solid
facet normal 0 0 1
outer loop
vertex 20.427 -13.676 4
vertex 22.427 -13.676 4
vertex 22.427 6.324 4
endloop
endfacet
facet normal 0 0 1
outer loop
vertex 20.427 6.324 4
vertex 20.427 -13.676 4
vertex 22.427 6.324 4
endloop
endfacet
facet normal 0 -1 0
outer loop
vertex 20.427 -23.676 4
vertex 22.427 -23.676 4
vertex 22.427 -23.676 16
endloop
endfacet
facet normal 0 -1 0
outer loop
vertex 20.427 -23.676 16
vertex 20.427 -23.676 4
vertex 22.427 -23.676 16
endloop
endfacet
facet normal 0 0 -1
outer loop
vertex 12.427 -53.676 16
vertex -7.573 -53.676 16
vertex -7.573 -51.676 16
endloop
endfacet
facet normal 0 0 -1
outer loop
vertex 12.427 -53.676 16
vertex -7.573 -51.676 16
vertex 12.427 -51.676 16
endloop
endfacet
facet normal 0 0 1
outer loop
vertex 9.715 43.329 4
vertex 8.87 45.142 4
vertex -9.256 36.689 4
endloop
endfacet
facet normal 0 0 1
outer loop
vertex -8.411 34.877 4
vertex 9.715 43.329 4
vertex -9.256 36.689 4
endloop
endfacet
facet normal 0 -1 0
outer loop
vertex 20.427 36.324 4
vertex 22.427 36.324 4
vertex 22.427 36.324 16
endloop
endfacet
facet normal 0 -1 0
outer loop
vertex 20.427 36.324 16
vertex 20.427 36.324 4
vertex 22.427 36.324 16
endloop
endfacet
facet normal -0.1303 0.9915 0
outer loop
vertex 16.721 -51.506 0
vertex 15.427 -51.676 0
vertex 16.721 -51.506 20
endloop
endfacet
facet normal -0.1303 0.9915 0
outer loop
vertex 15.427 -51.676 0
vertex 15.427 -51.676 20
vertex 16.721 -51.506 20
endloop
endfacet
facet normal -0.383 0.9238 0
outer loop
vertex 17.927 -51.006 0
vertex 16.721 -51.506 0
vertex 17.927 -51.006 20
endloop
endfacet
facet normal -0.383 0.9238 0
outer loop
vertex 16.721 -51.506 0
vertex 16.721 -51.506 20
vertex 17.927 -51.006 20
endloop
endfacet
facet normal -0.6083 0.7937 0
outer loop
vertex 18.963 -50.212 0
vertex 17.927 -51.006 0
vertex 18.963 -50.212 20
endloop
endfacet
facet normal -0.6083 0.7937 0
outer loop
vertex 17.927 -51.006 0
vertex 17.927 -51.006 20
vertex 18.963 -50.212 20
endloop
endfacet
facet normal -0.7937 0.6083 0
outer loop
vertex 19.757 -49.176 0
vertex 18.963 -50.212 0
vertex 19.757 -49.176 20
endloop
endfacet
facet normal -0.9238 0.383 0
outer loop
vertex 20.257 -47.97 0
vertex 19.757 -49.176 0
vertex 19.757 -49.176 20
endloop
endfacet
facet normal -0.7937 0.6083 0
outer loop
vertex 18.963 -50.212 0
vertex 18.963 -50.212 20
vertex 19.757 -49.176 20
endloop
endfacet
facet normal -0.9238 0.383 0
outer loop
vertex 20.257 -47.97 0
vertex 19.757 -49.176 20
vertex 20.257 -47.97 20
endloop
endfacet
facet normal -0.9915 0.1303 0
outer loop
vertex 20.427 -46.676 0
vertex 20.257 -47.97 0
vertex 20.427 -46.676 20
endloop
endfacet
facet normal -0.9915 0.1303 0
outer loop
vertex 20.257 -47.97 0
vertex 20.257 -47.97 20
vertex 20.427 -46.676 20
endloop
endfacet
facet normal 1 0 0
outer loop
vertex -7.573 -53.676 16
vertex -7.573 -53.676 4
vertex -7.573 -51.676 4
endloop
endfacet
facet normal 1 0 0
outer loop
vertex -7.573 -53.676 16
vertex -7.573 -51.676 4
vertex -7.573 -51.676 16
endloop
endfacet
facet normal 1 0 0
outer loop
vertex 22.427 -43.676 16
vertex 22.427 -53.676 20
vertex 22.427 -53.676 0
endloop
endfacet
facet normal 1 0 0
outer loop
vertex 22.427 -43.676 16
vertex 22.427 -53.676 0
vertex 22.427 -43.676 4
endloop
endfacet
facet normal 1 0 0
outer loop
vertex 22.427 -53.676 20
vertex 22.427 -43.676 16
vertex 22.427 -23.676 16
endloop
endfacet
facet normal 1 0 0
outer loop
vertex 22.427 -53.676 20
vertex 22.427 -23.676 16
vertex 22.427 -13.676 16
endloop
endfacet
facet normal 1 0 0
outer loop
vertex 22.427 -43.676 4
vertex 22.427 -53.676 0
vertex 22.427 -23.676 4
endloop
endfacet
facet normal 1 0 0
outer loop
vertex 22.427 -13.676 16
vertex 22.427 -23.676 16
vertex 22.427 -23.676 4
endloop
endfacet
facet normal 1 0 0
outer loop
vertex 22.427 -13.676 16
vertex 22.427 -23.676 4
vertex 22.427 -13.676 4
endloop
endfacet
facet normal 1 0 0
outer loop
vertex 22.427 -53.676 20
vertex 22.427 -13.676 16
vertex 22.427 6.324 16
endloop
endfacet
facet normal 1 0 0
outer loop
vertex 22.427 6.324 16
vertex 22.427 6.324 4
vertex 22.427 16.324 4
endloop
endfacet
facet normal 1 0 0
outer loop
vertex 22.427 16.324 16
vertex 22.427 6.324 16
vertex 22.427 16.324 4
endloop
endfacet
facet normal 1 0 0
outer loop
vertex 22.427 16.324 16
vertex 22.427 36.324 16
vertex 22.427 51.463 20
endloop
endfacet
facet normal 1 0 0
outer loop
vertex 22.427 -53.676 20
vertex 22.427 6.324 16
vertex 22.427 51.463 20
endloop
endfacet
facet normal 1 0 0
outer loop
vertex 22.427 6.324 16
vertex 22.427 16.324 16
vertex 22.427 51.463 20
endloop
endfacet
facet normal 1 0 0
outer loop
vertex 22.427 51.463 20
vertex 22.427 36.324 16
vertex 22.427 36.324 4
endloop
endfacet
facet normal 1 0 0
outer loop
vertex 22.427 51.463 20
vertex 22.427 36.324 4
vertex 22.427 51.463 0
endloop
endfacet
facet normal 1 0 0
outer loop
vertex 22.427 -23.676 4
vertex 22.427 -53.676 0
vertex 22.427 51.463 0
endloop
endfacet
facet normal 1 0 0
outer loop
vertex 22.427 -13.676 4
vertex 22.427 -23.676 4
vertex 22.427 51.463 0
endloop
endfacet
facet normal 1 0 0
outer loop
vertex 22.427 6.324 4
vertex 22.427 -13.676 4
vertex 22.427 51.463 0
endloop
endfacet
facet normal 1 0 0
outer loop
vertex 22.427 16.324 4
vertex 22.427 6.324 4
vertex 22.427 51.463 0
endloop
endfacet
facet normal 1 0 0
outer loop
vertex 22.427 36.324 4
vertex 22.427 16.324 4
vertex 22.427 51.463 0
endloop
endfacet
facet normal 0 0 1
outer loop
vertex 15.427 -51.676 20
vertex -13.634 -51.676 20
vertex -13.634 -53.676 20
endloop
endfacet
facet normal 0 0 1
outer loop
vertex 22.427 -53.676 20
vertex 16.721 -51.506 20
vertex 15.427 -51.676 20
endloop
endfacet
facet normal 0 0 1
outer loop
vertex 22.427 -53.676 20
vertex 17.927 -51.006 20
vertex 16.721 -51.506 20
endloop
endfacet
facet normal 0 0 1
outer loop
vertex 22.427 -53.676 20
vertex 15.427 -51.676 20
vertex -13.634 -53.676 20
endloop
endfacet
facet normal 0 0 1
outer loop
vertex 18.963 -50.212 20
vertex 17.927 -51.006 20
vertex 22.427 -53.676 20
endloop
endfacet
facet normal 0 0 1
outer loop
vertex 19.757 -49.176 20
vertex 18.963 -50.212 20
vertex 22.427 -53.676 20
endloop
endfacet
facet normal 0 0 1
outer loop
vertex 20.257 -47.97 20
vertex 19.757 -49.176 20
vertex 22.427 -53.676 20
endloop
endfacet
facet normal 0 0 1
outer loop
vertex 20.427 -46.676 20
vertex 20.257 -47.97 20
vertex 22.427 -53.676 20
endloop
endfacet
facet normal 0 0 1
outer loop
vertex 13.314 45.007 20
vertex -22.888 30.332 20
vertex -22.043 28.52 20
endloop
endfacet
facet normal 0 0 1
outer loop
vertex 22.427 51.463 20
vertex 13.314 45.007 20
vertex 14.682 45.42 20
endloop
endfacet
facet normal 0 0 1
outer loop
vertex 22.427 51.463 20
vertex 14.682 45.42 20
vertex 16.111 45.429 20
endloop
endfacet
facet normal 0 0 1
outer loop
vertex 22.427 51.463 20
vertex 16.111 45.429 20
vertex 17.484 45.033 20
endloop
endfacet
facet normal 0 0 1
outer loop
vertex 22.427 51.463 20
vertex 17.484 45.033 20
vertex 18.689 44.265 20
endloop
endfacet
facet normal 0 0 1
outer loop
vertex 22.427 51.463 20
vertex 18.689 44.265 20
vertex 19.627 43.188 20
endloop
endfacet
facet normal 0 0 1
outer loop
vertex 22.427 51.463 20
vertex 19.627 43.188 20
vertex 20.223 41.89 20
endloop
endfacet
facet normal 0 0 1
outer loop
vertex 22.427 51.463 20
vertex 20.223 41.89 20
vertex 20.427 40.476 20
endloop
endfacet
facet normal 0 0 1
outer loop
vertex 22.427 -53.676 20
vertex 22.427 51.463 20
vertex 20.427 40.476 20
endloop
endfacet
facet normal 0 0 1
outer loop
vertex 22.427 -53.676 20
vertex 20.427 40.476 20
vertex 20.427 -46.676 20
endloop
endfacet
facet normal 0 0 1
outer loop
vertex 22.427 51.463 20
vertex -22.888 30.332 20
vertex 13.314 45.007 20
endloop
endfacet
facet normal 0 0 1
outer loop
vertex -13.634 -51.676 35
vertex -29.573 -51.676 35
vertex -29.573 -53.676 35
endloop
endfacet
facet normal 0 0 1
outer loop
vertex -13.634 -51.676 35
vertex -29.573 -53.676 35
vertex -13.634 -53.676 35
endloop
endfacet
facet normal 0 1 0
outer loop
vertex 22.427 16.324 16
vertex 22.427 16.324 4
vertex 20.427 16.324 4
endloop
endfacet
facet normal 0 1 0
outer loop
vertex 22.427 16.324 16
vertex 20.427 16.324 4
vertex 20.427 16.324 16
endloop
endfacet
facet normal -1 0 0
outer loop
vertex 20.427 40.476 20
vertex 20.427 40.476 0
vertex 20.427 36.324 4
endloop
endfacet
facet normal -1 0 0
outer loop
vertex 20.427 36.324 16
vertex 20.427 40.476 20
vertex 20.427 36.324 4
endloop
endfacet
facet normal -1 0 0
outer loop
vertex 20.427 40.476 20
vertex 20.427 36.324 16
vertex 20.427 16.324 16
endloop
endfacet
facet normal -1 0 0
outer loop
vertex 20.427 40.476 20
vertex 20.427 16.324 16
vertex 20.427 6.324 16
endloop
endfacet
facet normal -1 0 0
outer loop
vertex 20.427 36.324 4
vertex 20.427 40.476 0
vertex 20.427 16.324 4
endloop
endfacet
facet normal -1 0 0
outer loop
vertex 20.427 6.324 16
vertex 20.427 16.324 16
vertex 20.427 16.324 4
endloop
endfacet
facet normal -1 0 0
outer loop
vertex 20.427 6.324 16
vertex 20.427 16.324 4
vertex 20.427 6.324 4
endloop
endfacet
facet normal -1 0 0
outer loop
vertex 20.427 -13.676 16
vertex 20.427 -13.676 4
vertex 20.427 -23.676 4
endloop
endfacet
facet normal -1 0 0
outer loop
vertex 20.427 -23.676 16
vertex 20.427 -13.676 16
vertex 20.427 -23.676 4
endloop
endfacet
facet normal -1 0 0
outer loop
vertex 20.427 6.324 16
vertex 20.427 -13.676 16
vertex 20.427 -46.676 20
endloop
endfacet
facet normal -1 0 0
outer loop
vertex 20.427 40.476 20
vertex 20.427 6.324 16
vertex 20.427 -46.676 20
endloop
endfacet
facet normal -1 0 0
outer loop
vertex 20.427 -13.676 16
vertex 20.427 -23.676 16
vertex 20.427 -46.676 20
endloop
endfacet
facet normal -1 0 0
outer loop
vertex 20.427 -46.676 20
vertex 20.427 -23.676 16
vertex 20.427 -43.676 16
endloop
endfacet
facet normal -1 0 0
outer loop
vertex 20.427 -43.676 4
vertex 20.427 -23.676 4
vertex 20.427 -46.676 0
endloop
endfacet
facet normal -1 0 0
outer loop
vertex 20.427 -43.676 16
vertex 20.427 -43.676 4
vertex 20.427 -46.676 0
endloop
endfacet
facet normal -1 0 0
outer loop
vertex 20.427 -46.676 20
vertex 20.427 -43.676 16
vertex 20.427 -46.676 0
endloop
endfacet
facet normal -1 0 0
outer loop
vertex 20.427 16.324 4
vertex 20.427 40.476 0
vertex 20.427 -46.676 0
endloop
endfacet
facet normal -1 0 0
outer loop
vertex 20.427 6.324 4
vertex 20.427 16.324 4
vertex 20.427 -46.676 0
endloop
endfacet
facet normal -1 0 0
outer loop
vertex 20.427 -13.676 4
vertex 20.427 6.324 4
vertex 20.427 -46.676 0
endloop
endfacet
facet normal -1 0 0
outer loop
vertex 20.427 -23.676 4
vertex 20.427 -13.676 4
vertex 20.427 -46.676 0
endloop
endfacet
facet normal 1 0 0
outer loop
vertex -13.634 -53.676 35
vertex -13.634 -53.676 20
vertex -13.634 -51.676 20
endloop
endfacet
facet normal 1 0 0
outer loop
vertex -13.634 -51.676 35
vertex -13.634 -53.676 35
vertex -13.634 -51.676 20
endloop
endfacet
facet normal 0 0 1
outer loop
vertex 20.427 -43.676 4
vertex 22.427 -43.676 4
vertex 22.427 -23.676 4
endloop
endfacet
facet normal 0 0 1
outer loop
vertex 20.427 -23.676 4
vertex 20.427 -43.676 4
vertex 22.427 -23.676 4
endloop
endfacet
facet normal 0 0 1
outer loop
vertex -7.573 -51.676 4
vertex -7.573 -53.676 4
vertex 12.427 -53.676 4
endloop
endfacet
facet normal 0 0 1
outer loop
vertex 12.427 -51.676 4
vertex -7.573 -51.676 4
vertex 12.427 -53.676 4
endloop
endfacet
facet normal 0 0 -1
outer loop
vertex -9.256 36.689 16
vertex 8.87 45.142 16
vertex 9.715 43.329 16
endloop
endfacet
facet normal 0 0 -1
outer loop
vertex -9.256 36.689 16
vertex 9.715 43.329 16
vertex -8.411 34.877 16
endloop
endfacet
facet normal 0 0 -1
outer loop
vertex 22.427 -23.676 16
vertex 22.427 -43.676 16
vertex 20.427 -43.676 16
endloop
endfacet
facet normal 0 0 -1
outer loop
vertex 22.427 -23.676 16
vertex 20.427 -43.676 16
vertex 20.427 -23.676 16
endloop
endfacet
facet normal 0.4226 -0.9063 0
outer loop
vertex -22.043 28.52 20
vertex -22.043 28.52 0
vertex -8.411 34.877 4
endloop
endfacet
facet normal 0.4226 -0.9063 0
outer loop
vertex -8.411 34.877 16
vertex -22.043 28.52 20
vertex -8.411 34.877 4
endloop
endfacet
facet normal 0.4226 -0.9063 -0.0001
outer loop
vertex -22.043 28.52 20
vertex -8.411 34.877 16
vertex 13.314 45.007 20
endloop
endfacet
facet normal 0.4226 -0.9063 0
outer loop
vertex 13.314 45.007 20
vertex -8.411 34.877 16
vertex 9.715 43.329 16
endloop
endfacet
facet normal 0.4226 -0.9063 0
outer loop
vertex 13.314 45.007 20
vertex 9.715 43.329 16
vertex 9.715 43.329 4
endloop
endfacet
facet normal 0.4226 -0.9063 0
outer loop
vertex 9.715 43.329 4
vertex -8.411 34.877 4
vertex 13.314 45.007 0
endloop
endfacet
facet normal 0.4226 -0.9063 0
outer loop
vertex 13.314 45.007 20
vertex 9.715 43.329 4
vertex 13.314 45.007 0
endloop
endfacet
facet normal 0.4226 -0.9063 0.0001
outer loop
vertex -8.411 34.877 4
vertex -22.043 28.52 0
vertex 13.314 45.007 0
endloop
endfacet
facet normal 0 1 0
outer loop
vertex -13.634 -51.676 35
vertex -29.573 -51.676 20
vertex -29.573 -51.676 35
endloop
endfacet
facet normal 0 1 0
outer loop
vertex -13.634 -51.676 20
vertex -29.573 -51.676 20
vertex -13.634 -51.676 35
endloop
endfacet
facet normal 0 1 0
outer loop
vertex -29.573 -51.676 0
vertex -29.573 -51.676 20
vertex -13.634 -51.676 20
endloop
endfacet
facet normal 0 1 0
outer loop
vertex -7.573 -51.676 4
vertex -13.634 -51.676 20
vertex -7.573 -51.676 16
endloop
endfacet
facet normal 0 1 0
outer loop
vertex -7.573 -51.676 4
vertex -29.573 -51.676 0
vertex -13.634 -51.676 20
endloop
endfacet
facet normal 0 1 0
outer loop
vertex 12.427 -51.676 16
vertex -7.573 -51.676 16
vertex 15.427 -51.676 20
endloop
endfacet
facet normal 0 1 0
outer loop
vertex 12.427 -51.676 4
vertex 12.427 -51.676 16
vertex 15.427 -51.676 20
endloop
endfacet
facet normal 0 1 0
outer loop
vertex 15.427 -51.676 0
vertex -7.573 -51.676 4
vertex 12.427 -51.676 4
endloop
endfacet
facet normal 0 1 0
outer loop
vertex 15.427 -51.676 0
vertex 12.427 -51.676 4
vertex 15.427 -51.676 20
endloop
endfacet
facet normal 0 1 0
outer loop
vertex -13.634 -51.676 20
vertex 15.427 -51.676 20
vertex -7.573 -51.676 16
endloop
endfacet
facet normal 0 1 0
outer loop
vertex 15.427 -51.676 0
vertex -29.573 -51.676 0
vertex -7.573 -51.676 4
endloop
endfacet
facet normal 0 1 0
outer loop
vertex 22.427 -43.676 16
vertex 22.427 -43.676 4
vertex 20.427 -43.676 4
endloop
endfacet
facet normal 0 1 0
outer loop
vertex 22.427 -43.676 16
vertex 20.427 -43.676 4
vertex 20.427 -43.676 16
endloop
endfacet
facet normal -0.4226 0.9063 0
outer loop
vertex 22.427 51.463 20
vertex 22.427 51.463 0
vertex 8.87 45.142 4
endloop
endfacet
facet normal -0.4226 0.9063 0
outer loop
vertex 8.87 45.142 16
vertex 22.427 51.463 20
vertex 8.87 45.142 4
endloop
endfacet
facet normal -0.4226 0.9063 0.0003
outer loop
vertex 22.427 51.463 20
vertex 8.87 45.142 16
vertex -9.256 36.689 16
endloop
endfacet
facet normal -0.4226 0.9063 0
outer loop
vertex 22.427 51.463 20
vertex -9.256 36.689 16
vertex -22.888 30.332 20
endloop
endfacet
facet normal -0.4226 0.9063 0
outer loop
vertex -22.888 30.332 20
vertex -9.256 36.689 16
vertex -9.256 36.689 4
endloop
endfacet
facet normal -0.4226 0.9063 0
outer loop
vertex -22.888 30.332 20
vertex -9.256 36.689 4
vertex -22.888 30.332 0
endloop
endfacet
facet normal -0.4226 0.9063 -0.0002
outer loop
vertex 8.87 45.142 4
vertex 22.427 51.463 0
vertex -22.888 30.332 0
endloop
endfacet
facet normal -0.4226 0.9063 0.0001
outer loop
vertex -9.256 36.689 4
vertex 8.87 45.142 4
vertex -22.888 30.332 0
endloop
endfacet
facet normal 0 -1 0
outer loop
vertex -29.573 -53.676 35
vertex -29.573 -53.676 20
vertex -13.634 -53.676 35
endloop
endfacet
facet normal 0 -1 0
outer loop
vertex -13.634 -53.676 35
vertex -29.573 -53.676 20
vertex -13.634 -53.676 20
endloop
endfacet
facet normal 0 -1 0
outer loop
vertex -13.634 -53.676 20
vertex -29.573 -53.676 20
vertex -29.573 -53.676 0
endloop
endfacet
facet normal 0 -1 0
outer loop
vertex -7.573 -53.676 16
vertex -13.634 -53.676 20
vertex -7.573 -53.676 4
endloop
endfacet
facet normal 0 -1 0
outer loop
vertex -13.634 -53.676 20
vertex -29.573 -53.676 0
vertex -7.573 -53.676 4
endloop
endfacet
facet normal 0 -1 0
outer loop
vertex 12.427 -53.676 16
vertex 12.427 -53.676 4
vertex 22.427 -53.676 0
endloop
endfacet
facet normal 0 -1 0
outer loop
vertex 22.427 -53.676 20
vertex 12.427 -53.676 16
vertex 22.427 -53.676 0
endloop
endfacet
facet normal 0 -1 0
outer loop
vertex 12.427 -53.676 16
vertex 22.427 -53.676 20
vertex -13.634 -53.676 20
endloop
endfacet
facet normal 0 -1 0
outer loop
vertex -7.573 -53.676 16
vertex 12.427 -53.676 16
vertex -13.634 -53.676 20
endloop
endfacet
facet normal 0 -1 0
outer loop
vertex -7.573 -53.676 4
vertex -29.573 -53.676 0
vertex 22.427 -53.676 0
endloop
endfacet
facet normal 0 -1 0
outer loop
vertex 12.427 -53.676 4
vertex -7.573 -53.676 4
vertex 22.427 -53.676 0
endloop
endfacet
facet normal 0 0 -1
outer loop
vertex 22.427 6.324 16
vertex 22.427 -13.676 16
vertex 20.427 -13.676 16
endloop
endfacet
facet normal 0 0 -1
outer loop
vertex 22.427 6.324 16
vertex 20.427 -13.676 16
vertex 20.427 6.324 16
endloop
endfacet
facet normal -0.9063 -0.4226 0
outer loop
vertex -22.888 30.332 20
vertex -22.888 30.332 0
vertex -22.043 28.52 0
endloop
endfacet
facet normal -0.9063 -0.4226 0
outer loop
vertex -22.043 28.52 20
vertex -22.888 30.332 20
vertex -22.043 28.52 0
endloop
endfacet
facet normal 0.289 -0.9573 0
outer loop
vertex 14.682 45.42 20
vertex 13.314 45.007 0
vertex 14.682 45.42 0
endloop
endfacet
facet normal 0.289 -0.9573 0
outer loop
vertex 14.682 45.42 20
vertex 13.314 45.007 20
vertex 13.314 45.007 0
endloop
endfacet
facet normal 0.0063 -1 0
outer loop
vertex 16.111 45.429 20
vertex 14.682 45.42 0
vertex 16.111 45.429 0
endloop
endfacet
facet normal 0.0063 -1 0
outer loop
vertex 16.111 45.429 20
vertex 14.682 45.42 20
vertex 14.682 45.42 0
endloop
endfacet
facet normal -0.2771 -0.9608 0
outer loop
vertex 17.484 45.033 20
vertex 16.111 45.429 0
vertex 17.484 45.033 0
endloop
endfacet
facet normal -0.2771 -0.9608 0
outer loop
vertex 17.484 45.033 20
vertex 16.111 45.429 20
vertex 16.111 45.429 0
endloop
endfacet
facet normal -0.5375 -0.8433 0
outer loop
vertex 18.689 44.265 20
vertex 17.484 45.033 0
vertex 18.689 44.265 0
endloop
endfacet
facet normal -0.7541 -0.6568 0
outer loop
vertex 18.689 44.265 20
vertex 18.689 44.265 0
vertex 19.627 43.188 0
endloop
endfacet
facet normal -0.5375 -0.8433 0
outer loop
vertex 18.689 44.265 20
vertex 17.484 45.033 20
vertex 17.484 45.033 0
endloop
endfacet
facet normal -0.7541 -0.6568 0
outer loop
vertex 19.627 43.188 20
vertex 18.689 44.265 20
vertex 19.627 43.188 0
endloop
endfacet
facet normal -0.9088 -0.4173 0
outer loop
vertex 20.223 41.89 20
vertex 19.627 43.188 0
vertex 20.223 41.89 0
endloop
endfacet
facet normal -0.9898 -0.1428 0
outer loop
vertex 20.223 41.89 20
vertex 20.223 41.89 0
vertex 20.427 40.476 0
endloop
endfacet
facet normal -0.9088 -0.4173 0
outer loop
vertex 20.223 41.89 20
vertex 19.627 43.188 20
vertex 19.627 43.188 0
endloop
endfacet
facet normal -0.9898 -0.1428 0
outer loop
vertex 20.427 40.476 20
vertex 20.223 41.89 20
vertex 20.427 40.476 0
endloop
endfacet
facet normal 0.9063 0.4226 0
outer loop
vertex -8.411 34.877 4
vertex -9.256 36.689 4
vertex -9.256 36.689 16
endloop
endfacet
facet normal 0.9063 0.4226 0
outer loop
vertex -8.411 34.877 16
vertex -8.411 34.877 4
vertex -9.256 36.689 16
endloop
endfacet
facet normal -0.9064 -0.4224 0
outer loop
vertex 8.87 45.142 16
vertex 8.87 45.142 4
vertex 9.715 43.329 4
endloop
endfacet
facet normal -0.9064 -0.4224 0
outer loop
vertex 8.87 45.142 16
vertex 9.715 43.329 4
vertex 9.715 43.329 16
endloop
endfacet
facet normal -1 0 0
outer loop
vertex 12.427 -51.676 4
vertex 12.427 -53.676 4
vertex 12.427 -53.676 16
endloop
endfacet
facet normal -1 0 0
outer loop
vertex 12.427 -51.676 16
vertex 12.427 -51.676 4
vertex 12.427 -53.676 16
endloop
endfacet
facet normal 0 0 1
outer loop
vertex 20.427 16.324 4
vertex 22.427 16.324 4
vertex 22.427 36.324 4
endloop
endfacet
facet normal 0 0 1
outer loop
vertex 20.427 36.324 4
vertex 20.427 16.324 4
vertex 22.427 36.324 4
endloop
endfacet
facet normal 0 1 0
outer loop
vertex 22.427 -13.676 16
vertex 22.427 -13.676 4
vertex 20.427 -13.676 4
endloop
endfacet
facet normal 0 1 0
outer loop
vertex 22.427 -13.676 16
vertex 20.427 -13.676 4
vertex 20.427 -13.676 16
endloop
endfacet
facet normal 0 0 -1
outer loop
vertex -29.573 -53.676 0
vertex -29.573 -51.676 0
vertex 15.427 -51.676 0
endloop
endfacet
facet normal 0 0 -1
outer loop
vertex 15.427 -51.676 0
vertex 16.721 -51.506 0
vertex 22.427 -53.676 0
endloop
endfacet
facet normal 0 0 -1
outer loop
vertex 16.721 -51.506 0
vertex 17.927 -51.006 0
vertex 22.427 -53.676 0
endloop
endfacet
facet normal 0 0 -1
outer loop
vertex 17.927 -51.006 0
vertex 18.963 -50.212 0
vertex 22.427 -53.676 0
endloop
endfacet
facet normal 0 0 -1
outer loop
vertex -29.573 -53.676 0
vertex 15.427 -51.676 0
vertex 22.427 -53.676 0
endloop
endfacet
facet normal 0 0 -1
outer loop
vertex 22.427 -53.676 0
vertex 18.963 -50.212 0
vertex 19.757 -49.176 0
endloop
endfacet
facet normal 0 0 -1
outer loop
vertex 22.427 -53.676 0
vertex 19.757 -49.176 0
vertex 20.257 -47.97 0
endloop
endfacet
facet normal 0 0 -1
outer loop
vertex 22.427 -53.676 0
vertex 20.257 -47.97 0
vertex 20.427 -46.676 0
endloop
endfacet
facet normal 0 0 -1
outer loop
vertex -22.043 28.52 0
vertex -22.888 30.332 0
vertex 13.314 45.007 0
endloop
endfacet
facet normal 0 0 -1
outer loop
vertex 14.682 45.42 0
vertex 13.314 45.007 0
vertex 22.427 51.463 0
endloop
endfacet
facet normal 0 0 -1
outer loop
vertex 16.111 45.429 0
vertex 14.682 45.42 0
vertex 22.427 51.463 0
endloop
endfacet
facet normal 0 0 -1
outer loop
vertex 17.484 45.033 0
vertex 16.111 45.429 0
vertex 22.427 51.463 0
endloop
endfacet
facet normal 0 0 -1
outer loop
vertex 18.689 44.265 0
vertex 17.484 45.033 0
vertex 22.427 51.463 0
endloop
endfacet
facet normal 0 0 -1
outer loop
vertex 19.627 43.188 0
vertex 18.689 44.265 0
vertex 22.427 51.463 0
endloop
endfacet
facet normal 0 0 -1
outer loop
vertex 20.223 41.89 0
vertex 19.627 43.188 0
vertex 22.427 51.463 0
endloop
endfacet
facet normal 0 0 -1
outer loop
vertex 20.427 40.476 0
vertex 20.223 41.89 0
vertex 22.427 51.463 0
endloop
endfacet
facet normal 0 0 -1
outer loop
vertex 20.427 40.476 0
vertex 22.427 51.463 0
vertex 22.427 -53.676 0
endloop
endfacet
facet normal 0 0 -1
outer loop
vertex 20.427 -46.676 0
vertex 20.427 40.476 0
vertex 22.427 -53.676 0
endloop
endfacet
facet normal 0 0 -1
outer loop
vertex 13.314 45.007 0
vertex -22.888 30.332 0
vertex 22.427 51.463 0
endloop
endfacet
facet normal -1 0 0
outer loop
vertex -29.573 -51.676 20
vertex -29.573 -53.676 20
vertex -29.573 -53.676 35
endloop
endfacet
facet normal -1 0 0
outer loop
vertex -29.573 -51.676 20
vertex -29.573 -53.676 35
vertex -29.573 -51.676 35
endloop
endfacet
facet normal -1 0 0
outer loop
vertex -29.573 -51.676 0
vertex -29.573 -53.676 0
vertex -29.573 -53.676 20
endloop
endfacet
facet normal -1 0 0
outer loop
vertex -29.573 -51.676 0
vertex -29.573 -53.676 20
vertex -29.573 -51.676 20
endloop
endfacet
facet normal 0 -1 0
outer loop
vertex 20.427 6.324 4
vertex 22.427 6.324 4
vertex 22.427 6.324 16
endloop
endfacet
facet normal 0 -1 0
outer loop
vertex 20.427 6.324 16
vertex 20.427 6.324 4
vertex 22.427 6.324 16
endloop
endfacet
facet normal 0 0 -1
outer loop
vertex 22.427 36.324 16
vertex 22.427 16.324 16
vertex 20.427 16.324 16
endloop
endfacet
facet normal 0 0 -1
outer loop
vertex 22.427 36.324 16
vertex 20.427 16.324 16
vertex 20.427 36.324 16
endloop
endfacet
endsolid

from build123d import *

# Parameters (mm, degrees)
F1_DEPTH  = 20
F2_R      = 5
F3_W      = 15.9383661317
F3_H      = 2
F4_DEPTH  = 15
F5_W      = 20
F5_H      = 12
F6_DEPTH  = 2
F7_W      = 20
F7_H      = 12
F8_DEPTH  = 15.2
F9_W      = 20
F9_H      = 12
F10_DEPTH = 25


with BuildPart() as f1:
    # F0 (on Top) → F1 (new body)
    with BuildSketch(Plane.XY):
        Polygon((20.42718686, -51.6759875909), (-29.57281314, -51.6759875909), (-29.57281314, -53.6759875909), (22.42718686, -53.6759875909), (22.42718686, 51.4633835634), (-22.8882024919, 30.3324704763), (-22.0429659684, 28.5198549023), (20.42718686, 48.3240124091), align=None)
    extrude(amount=F1_DEPTH)

    # F2
    f2_edges = [f1.edges().sort_by_distance(p)[0] for p in [
        (20.427187, 48.324012, 10),
        (20.427187, -51.675988, 10),
    ]]
    fillet(f2_edges, radius=F2_R)

    # F3 (on face) → F4 (join)
    with BuildSketch(Plane.XY.offset(20)):
        with Locations((-21.6036300742, -52.6759875909)):
            Rectangle(F3_W, F3_H)
    extrude(amount=F4_DEPTH)

    # F5 (on face) → F6 (cut, through all)
    with BuildSketch(Plane.YZ.offset(22.42718686)):
        with Locations((-33.6759875909, 10)):
            Rectangle(F5_W, F5_H)
        with Locations((-3.6759875909, 10)):
            Rectangle(F5_W, F5_H)
        with Locations((26.3240124091, 10)):
            Rectangle(F5_W, F5_H)
    extrude(amount=-F6_DEPTH, mode=Mode.SUBTRACT)

    # F7 (on face) → F8 (cut)
    with BuildSketch(Plane(origin=(-15.7059849883, 33.6815935008, 0), x_dir=(-0.906307787, -0.4226182617, 0), z_dir=(-0.4226182617, 0.906307787, 0))):
        with Locations((-17.1167086999, 10)):
            Rectangle(F7_W, F7_H)
    extrude(amount=-F8_DEPTH, mode=Mode.SUBTRACT)

    # F9 (on face) → F10 (cut)
    with BuildSketch(Plane.XZ.offset(53.6759875909)):
        with Locations((2.42718686, 10)):
            Rectangle(F9_W, F9_H)
    extrude(amount=-F10_DEPTH, mode=Mode.SUBTRACT)


solid = f1.part
